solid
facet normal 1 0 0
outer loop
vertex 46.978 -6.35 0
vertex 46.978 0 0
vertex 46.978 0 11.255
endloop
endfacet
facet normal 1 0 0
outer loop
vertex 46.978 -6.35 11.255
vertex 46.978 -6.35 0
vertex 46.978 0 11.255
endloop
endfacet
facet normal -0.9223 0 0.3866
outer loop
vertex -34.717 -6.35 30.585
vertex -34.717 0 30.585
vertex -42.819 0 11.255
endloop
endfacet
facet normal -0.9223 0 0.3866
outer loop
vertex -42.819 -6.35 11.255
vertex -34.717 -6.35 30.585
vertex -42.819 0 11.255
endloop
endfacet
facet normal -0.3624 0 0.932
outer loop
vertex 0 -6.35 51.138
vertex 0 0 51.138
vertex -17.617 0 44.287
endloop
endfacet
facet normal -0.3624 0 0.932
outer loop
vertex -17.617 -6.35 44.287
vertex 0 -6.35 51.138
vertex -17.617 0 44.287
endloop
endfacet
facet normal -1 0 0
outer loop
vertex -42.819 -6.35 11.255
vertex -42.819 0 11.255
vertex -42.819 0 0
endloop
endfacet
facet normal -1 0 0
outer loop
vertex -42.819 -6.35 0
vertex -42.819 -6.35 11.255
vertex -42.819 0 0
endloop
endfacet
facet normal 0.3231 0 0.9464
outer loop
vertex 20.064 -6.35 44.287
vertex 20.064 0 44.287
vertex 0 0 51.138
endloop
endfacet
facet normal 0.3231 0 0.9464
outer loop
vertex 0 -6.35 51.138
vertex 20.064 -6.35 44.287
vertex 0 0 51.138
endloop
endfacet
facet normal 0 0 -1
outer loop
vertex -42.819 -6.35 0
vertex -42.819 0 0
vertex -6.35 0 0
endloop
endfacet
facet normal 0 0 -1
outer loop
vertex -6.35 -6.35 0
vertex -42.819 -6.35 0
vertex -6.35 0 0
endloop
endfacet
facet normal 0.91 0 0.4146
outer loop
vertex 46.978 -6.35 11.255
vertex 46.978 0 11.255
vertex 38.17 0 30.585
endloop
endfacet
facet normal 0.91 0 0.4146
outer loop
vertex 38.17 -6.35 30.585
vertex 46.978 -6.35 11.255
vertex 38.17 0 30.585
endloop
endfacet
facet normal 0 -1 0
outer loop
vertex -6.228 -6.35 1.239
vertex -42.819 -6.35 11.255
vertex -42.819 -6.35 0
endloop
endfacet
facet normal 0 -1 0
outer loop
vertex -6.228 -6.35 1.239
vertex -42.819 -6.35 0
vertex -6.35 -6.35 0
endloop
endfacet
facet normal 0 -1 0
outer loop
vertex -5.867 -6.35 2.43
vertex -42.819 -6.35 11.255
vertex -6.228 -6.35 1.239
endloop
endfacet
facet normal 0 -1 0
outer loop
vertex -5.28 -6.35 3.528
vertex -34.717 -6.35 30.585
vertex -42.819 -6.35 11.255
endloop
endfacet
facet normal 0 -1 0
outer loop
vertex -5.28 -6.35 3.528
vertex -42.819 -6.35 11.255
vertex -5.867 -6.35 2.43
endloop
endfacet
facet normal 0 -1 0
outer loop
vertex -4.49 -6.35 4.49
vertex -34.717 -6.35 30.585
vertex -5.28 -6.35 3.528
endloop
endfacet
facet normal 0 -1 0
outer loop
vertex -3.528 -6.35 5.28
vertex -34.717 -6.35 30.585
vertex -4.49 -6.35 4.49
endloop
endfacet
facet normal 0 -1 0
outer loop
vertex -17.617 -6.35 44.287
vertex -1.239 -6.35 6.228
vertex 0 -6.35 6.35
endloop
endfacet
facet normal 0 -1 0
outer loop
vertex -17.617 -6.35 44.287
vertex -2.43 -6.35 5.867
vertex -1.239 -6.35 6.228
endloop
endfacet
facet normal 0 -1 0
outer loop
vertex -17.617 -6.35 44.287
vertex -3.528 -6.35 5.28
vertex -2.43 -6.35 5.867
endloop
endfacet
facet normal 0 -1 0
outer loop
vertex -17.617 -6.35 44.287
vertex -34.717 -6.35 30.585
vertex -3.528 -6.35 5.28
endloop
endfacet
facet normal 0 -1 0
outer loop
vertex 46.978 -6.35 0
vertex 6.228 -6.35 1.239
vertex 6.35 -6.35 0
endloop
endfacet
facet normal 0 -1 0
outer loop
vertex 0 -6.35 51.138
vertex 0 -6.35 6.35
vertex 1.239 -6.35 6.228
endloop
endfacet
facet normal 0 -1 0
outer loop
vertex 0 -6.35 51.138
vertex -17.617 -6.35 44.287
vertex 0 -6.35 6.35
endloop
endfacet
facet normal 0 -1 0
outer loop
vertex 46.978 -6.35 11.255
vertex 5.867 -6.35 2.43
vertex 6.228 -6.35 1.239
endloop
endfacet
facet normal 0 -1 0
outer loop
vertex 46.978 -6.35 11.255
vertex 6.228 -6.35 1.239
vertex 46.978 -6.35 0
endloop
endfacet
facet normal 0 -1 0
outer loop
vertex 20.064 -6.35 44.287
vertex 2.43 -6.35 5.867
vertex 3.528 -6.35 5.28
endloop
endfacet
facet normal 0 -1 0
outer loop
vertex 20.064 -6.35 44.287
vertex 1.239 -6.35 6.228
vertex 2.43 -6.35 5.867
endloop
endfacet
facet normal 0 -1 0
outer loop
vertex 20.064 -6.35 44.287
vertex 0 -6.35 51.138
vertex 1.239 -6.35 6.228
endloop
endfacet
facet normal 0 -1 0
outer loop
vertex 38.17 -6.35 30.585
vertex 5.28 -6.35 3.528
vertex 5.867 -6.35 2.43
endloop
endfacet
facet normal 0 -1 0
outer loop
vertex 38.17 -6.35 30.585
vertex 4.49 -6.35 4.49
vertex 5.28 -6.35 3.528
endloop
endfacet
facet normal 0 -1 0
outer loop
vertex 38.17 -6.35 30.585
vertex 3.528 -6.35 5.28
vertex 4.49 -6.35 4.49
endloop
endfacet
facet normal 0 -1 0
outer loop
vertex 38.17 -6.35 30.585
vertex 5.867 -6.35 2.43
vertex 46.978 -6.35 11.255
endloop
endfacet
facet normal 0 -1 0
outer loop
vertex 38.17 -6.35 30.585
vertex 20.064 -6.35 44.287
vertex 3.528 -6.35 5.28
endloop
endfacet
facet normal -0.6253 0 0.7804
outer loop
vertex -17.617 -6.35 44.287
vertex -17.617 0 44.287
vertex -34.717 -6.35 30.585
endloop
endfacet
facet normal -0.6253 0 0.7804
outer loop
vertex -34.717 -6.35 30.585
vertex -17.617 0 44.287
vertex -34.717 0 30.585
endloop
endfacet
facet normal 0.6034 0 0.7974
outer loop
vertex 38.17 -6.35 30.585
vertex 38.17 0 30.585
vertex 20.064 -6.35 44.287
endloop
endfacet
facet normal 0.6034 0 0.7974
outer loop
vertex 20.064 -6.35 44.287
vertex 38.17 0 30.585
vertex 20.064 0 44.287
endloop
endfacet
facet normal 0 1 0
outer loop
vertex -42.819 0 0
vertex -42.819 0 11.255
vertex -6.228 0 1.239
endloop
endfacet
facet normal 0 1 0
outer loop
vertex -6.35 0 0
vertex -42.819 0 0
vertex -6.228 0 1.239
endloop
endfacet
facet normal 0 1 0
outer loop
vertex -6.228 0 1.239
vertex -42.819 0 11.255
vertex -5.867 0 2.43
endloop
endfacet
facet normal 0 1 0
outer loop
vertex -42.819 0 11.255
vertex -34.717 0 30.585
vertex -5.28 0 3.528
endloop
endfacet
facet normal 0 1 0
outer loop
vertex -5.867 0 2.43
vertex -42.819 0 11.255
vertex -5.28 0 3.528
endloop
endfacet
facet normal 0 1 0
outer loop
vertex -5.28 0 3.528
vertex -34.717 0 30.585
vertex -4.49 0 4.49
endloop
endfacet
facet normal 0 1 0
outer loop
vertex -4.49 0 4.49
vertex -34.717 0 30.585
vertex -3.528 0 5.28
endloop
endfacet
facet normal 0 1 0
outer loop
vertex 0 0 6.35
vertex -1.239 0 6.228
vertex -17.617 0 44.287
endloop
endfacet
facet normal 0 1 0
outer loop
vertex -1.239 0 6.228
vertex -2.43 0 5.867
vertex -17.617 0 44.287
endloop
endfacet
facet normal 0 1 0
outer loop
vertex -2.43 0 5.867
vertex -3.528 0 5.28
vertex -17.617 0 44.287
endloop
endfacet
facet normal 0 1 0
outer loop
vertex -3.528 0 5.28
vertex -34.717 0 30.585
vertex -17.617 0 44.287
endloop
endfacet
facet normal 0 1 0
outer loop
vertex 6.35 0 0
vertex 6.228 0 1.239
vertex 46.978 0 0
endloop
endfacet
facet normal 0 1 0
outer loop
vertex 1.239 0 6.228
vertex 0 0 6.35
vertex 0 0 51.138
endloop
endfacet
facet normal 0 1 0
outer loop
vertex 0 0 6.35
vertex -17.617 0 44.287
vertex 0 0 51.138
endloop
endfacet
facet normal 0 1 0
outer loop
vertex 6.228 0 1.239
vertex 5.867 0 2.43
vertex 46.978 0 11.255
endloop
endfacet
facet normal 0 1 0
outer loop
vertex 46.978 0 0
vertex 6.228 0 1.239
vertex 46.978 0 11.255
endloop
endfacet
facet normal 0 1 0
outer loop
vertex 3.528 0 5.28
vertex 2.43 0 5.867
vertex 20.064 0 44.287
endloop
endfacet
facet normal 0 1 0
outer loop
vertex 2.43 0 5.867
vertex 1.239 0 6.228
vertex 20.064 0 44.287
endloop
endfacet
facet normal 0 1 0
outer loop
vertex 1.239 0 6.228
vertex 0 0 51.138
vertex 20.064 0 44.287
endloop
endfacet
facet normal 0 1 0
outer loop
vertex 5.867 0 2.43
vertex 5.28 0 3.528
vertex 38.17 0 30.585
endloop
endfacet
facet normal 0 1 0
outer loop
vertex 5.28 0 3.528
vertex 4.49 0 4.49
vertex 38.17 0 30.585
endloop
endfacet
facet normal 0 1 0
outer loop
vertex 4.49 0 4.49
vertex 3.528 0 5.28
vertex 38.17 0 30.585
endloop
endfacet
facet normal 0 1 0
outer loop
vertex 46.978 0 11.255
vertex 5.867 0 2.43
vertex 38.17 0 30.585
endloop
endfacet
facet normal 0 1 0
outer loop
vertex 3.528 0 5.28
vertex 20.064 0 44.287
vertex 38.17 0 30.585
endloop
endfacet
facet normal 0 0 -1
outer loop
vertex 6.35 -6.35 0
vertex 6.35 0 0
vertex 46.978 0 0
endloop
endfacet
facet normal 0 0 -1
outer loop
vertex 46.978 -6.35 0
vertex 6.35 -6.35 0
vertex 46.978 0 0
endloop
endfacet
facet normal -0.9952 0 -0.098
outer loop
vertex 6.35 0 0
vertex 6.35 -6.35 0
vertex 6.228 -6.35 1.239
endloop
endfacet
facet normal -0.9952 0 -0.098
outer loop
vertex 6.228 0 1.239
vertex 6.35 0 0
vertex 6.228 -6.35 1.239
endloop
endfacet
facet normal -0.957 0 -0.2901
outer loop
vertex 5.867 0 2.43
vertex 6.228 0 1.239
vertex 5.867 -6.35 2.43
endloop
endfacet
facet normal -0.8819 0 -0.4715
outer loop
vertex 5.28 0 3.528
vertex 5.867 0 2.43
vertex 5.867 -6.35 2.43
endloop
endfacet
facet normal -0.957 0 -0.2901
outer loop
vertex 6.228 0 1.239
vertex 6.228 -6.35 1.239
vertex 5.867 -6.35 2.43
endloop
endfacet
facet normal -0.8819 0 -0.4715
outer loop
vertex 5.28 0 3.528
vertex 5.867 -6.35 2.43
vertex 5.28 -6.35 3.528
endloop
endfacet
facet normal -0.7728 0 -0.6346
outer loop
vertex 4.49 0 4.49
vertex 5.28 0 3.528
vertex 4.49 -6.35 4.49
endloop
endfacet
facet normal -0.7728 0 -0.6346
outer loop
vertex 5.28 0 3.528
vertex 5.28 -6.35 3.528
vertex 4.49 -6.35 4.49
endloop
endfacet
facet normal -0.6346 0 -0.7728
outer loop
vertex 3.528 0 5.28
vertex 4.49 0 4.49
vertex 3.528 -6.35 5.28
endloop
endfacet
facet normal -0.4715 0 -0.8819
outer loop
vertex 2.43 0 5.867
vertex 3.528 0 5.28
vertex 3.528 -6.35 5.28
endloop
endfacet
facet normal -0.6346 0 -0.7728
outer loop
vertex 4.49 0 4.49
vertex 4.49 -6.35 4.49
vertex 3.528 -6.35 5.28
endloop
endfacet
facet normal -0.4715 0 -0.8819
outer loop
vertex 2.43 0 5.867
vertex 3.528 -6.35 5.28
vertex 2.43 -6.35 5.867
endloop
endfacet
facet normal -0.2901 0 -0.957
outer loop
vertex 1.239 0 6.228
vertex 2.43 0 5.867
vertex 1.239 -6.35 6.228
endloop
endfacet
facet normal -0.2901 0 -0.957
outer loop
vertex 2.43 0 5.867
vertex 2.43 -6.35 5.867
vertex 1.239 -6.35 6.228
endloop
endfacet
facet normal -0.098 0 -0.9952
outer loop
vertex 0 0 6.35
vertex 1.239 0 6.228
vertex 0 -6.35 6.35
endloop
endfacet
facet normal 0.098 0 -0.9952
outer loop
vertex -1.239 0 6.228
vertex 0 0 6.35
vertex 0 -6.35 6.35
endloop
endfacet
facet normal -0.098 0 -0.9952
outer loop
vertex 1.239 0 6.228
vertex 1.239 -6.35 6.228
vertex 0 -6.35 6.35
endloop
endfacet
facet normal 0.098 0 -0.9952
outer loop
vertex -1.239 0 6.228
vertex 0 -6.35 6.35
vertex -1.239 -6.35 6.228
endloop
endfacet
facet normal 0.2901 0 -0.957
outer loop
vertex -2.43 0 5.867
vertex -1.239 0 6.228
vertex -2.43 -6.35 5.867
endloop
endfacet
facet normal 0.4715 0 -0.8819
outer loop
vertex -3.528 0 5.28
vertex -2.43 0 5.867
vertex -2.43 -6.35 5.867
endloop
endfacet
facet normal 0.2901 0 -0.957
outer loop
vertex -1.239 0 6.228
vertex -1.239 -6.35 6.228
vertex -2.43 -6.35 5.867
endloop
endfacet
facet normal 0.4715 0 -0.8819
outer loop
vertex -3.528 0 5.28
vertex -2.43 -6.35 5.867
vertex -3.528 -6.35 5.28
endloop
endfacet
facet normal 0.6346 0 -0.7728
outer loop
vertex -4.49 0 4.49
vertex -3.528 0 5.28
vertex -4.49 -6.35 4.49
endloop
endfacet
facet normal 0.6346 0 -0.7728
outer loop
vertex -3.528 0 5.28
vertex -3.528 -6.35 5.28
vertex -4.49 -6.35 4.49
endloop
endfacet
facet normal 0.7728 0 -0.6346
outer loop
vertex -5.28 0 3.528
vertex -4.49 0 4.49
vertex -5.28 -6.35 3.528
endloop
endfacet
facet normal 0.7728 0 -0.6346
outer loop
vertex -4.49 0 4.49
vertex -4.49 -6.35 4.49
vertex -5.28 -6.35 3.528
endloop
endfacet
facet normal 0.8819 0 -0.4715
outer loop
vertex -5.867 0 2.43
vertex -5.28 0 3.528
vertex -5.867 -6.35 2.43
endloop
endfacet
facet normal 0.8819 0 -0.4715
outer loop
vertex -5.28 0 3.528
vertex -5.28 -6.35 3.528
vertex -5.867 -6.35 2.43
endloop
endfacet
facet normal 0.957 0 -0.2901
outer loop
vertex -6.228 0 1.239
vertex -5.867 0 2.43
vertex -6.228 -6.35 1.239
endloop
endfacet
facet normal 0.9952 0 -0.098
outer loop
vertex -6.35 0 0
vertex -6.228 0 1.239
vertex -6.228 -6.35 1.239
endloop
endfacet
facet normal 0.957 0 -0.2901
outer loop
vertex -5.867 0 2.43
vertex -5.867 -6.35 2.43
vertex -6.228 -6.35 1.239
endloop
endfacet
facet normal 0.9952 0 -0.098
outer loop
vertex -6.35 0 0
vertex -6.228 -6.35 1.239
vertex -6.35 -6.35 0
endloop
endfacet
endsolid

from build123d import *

# Parameters (mm, degrees)
F1_DEPTH = 6.35
F3_D     = 12.7


with BuildPart() as f1:
    # F0 (on Front) → F1 (new body)
    with BuildSketch(Plane.XZ):
        Polygon((20.06367, 44.286881), (0, 51.137887), (0, 0), align=None)
        Polygon((0, 0), (0, 51.137887), (-17.616881, 44.286881), align=None)
        Polygon((20.06367, 44.286881), (0, 0), (38.169909, 30.584864), align=None)
        Polygon((38.169909, 30.584864), (0, 0), (46.978351, 11.25523), align=None)
        Polygon((46.978351, 11.25523), (0, 0), (46.978351, 0), align=None)
        Polygon((-34.716997, 30.584864), (0, 0), (-17.616881, 44.286881), align=None)
        Polygon((-42.818807, 11.25523), (0, 0), (-34.716997, 30.584864), align=None)
        Polygon((-42.818807, 0), (0, 0), (-42.818807, 11.25523), align=None)
    extrude(amount=F1_DEPTH)

    # F3 (through all)
    with Locations(Plane(origin=(0, 0, 0), x_dir=(1, 0, 0), z_dir=(0, 1, 0))):
        with Locations((0, 0)):
            Hole(F3_D / 2)


solid = f1.part
